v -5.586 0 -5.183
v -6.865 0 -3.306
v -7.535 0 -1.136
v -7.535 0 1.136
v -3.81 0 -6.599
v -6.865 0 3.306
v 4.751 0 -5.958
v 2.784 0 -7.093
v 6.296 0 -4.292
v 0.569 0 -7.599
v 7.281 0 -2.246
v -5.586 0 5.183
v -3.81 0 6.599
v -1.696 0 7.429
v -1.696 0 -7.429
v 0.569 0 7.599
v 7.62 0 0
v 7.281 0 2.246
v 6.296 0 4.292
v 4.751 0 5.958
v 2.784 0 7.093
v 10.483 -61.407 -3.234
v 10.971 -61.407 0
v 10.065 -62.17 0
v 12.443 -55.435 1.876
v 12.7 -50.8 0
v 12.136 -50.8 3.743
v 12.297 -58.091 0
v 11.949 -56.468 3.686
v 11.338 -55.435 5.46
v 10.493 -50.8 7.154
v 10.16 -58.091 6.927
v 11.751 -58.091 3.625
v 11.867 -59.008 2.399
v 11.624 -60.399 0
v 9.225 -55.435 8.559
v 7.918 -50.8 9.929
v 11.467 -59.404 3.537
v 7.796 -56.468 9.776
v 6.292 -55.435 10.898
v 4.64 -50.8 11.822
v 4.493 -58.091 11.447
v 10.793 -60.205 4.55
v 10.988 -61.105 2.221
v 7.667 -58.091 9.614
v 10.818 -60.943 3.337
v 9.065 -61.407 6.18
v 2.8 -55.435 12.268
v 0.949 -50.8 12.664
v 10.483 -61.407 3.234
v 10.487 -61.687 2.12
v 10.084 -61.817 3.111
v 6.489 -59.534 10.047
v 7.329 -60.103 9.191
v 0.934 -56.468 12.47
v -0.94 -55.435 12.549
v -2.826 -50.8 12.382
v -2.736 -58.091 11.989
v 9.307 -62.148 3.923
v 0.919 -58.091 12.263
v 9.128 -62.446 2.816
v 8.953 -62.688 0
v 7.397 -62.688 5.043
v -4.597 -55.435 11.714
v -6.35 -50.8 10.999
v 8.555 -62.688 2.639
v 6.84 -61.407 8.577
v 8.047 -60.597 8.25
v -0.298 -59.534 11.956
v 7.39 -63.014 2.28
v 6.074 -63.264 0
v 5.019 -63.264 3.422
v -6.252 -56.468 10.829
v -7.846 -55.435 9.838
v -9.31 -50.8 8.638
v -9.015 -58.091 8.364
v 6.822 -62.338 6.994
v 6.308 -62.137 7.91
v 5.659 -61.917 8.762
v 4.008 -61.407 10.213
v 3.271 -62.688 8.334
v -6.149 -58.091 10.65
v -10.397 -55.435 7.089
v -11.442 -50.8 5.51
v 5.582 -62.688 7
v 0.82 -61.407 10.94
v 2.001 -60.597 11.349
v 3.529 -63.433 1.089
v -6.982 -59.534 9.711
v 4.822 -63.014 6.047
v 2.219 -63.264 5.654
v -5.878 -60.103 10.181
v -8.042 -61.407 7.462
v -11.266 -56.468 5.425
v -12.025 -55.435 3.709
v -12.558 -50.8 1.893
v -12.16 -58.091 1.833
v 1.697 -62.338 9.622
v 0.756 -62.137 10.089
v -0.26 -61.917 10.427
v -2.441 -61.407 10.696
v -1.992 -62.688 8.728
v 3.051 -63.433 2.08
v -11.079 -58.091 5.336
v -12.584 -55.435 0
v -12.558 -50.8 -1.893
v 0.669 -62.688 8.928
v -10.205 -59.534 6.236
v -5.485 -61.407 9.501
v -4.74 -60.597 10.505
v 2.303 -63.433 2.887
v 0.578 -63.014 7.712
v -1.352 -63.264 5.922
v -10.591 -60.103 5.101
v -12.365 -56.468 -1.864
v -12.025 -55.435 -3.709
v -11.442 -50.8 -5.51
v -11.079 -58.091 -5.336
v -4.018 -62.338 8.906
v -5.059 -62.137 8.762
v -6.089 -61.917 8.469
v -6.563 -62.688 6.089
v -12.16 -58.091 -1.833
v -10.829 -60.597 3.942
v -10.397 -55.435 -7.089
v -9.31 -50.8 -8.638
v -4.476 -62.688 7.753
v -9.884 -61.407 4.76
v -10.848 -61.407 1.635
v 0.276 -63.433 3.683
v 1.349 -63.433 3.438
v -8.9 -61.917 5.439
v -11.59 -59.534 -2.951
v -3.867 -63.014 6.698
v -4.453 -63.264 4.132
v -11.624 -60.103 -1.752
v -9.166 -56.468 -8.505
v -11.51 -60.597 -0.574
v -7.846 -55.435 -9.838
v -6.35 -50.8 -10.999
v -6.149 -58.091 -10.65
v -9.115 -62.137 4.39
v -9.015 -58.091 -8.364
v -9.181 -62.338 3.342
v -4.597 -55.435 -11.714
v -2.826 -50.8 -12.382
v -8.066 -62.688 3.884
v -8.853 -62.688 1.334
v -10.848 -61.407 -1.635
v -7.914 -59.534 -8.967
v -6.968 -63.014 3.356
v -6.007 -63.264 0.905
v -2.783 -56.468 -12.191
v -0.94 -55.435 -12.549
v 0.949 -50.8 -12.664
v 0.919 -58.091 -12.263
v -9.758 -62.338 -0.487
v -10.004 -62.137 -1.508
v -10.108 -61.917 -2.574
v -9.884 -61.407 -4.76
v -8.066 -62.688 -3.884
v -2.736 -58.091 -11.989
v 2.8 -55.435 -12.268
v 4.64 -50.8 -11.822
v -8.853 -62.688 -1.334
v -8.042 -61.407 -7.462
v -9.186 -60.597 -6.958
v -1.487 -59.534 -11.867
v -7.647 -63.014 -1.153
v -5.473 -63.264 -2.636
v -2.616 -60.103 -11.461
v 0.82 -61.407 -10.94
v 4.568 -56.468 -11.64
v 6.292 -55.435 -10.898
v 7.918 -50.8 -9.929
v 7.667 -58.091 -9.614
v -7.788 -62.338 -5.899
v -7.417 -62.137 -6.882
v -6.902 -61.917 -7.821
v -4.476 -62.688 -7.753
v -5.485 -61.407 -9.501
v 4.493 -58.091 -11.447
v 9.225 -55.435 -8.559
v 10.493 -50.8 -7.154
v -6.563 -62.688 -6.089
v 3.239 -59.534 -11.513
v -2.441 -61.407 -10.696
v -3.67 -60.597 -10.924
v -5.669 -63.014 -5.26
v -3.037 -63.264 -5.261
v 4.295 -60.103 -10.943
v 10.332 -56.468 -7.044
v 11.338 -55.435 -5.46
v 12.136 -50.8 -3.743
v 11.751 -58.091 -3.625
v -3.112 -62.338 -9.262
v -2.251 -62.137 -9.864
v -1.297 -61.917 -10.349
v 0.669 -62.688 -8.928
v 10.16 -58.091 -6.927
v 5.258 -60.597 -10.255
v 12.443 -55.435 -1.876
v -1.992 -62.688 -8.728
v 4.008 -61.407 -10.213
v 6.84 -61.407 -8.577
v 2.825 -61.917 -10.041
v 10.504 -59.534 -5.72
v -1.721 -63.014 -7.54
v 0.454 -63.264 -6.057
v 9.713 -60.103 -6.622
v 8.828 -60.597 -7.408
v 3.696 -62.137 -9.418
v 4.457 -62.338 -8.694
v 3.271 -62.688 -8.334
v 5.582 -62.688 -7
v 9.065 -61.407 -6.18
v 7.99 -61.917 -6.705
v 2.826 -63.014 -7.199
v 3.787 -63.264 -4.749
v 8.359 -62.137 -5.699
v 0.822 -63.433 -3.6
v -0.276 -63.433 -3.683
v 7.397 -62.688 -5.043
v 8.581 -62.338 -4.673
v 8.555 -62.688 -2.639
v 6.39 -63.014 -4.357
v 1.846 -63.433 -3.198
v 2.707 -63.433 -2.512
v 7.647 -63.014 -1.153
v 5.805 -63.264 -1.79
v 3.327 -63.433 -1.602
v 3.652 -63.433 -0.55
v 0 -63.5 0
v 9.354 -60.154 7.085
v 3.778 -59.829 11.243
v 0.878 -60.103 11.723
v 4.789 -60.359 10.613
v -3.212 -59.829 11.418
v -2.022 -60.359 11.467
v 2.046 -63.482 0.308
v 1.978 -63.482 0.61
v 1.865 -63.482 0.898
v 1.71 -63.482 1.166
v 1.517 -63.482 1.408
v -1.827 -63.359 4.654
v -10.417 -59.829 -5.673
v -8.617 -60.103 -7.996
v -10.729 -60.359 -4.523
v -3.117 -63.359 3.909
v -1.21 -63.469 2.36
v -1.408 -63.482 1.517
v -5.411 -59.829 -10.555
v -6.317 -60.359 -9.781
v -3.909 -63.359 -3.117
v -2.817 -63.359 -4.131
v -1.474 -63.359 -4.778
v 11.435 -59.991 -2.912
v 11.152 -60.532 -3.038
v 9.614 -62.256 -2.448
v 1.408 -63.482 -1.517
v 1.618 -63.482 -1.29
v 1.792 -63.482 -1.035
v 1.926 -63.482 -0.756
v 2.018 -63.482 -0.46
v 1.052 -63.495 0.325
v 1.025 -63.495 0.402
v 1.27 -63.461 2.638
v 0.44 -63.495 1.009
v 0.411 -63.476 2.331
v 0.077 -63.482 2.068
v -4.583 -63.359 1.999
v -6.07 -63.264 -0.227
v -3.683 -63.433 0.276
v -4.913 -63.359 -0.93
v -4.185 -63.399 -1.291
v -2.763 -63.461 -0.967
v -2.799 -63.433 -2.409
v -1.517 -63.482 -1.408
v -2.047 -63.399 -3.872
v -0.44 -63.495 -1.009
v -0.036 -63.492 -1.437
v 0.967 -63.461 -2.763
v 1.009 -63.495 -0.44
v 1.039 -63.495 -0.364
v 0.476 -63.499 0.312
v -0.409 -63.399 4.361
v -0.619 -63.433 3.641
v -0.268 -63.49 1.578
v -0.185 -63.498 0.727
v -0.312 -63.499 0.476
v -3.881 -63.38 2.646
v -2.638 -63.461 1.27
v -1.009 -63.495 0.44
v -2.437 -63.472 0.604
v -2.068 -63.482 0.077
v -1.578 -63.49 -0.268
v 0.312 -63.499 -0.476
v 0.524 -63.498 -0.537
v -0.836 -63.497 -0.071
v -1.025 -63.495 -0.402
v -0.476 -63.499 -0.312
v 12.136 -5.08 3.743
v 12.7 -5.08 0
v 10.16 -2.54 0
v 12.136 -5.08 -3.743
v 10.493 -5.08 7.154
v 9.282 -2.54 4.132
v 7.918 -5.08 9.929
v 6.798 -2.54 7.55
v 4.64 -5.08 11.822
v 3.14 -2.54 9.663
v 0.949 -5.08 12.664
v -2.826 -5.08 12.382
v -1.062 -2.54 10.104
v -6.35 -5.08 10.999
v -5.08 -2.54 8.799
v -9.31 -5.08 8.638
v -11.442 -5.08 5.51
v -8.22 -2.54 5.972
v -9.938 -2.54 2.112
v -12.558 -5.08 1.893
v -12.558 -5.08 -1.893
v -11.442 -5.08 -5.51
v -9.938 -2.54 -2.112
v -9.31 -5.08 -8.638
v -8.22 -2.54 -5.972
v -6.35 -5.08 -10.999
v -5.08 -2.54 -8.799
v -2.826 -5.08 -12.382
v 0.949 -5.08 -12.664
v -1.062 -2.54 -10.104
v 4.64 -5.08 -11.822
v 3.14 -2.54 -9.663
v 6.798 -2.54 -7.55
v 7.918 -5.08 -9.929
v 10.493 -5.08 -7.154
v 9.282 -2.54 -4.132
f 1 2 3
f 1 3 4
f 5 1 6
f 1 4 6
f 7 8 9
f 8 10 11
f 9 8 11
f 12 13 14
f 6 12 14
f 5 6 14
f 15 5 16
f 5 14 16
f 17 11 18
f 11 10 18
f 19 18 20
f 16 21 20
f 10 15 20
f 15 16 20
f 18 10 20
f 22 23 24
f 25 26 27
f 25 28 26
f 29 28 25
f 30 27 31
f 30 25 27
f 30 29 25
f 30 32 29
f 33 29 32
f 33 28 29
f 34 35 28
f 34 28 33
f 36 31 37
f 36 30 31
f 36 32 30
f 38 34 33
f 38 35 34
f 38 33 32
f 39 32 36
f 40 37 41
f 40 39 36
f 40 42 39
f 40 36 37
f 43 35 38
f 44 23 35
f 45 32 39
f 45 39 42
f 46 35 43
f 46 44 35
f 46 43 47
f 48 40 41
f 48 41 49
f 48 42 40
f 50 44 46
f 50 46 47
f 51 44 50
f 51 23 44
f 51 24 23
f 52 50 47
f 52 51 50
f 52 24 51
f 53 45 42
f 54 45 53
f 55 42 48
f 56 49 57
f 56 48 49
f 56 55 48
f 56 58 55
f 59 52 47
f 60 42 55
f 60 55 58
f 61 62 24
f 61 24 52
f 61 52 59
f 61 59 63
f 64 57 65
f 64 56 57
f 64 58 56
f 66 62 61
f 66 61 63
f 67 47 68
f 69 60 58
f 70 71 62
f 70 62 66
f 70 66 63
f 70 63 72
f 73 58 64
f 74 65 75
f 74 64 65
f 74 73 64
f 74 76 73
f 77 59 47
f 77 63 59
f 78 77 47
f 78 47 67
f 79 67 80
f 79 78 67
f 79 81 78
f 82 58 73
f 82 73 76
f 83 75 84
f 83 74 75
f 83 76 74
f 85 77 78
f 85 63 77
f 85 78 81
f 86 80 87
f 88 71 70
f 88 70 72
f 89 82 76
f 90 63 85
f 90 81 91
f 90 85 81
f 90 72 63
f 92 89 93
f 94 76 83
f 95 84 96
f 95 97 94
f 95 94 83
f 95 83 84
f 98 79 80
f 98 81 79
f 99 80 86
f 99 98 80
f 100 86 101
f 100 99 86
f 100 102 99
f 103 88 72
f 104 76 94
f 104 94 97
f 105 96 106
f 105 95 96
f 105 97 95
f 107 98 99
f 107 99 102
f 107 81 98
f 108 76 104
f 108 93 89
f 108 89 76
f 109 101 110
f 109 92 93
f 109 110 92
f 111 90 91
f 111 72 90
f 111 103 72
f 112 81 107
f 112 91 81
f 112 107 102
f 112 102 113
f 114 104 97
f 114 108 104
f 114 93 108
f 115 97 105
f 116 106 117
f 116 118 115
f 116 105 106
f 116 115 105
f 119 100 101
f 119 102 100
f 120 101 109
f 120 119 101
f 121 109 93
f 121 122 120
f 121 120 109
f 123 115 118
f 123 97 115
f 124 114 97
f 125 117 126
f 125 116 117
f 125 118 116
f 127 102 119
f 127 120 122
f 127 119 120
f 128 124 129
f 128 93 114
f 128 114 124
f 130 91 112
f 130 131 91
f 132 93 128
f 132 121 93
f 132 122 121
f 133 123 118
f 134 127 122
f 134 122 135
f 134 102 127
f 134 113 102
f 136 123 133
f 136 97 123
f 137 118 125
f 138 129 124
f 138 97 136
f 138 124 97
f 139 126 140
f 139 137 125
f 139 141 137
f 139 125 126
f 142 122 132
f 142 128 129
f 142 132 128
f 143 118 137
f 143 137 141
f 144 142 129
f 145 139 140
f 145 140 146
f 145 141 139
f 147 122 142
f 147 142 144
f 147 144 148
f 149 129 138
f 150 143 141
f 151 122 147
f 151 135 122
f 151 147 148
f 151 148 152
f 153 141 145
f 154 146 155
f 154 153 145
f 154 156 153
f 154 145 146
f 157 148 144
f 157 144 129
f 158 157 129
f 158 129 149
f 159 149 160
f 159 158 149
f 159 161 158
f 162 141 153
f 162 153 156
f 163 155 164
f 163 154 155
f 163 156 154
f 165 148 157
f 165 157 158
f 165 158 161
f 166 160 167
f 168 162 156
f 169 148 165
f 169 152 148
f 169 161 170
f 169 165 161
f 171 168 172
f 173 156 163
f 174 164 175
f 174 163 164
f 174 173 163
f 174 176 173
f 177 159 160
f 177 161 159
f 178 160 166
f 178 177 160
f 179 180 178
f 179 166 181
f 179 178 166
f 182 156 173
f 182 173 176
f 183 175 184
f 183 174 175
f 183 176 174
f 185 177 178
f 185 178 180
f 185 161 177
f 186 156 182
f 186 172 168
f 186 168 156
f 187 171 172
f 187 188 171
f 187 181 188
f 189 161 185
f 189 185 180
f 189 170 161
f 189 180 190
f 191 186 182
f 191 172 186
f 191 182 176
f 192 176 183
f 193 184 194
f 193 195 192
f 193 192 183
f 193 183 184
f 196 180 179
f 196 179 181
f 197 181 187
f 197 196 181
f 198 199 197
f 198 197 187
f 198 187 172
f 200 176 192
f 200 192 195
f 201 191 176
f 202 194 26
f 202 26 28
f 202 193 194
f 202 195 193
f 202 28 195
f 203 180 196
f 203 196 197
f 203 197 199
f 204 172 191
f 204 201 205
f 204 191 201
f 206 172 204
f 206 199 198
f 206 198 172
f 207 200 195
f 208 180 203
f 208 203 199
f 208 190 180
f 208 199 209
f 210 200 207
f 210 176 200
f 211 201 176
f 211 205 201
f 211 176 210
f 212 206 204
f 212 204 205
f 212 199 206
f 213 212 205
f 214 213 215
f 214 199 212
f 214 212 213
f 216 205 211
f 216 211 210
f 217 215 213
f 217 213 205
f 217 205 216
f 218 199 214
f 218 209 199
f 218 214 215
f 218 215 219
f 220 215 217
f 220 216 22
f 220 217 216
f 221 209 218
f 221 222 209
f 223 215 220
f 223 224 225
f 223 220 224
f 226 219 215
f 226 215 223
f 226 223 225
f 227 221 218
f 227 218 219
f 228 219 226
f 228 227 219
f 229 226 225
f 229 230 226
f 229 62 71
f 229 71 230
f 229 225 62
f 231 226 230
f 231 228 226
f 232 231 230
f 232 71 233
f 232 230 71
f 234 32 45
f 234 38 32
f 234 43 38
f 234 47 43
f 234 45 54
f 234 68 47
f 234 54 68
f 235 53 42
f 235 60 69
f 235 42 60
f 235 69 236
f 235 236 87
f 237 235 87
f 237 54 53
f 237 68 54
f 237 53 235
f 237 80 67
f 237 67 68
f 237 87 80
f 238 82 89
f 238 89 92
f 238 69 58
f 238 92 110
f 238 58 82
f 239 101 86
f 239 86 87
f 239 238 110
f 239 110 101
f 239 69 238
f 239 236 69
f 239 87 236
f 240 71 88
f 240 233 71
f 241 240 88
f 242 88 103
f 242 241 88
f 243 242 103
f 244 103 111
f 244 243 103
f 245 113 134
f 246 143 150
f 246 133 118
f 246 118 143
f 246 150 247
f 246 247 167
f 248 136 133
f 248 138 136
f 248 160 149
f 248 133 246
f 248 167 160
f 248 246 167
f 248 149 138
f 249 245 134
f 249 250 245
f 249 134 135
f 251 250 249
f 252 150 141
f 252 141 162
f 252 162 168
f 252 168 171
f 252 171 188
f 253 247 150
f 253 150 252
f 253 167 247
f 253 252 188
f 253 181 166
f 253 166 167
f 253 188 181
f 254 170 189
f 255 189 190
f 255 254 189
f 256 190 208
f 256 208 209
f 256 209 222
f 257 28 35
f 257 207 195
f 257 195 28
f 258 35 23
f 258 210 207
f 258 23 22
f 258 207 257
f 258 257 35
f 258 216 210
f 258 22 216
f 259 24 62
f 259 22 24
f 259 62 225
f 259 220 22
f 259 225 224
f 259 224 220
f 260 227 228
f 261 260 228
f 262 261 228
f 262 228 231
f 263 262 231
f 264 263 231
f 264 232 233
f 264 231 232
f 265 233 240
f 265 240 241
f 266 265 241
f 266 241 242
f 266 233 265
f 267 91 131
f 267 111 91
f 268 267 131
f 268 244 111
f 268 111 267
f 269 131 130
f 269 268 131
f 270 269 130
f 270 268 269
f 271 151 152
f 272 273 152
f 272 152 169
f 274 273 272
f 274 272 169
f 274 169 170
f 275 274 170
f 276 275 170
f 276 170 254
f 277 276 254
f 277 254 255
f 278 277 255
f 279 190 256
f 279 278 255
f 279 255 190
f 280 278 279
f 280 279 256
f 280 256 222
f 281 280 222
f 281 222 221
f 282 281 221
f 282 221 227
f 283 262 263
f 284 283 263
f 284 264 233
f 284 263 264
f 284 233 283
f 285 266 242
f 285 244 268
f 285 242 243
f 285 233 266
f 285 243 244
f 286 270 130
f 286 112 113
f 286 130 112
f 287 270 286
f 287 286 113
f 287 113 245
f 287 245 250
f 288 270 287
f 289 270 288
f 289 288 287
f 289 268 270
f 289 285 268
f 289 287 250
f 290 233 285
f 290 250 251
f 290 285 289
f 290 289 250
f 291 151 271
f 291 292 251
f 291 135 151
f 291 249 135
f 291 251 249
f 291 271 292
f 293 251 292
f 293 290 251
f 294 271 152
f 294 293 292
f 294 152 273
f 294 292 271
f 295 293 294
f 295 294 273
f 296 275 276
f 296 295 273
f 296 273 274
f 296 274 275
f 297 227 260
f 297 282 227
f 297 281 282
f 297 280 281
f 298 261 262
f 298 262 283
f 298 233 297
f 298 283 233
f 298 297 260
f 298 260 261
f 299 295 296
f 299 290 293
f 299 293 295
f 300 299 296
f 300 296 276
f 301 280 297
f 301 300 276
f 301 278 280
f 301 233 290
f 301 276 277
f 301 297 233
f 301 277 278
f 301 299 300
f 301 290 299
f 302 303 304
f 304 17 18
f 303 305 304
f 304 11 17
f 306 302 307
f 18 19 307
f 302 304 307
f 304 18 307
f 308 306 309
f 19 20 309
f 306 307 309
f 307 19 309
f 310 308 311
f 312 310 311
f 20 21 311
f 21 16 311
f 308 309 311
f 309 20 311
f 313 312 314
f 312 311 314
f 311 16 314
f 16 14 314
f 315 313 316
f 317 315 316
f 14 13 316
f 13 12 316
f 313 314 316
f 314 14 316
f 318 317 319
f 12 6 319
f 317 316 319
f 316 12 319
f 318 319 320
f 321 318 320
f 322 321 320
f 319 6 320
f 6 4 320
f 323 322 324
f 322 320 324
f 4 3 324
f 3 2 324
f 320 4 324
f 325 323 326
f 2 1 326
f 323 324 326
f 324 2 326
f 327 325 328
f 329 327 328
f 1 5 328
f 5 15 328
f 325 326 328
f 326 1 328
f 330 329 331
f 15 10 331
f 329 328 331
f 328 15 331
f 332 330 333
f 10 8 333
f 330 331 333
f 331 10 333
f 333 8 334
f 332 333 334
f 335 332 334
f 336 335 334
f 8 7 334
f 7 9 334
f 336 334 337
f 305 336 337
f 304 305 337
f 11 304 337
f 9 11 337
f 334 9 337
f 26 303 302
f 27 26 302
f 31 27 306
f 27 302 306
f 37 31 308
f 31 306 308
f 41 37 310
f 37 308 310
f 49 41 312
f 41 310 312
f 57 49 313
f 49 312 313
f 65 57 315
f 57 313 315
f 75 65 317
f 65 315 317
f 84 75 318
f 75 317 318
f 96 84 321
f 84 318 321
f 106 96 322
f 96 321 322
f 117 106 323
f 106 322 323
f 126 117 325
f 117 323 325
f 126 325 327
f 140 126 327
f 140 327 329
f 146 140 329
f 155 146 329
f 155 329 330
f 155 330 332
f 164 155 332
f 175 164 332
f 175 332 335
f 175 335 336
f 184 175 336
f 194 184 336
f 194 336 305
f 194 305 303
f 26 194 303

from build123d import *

# Parameters (mm, degrees)
F0_R     = 12.7
F1_DEPTH = 63.5
F2_SIZE  = 5.08


# Not quite as in the source:
# - a fillet or chamfer that OpenCascade refuses, or shapes differently, is made with other operations: its cross-section is extruded or revolved along the edge and cut away or added


with BuildPart() as f1:
    # F0 (on Front) → F1 (new body)
    with BuildSketch(Plane.XZ):
        Circle(F0_R)
    extrude(amount=F1_DEPTH)

    # F2
    f2_edges = [f1.edges().sort_by_distance(p)[0] for p in [
        (-12.7, 0, 0),
    ]]
    chamfer(f2_edges, length=F2_SIZE)

    # F3: fillet of radius 12.7 on 1 edges, made by hand

    # F3_s1 → F3_t2 (revolve, cut)
    with BuildSketch(Plane.XY):
        with BuildLine():
            add(Edge.make_bspline(
                [(12.7, -50.8), (12.7, -63.5), (0, -63.5)],
                knots=[0, 0, 0, 1, 1, 1], degree=2, weights=[1, 2.3333333333, 1]))
            Line((0, -63.5), (12.7, -63.5))
            Line((12.7, -63.5), (12.7, -50.8))
        make_face()
    revolve(axis=Axis((0, -63.5, 0), (0, -1, 0)), mode=Mode.SUBTRACT)


solid = f1.part
